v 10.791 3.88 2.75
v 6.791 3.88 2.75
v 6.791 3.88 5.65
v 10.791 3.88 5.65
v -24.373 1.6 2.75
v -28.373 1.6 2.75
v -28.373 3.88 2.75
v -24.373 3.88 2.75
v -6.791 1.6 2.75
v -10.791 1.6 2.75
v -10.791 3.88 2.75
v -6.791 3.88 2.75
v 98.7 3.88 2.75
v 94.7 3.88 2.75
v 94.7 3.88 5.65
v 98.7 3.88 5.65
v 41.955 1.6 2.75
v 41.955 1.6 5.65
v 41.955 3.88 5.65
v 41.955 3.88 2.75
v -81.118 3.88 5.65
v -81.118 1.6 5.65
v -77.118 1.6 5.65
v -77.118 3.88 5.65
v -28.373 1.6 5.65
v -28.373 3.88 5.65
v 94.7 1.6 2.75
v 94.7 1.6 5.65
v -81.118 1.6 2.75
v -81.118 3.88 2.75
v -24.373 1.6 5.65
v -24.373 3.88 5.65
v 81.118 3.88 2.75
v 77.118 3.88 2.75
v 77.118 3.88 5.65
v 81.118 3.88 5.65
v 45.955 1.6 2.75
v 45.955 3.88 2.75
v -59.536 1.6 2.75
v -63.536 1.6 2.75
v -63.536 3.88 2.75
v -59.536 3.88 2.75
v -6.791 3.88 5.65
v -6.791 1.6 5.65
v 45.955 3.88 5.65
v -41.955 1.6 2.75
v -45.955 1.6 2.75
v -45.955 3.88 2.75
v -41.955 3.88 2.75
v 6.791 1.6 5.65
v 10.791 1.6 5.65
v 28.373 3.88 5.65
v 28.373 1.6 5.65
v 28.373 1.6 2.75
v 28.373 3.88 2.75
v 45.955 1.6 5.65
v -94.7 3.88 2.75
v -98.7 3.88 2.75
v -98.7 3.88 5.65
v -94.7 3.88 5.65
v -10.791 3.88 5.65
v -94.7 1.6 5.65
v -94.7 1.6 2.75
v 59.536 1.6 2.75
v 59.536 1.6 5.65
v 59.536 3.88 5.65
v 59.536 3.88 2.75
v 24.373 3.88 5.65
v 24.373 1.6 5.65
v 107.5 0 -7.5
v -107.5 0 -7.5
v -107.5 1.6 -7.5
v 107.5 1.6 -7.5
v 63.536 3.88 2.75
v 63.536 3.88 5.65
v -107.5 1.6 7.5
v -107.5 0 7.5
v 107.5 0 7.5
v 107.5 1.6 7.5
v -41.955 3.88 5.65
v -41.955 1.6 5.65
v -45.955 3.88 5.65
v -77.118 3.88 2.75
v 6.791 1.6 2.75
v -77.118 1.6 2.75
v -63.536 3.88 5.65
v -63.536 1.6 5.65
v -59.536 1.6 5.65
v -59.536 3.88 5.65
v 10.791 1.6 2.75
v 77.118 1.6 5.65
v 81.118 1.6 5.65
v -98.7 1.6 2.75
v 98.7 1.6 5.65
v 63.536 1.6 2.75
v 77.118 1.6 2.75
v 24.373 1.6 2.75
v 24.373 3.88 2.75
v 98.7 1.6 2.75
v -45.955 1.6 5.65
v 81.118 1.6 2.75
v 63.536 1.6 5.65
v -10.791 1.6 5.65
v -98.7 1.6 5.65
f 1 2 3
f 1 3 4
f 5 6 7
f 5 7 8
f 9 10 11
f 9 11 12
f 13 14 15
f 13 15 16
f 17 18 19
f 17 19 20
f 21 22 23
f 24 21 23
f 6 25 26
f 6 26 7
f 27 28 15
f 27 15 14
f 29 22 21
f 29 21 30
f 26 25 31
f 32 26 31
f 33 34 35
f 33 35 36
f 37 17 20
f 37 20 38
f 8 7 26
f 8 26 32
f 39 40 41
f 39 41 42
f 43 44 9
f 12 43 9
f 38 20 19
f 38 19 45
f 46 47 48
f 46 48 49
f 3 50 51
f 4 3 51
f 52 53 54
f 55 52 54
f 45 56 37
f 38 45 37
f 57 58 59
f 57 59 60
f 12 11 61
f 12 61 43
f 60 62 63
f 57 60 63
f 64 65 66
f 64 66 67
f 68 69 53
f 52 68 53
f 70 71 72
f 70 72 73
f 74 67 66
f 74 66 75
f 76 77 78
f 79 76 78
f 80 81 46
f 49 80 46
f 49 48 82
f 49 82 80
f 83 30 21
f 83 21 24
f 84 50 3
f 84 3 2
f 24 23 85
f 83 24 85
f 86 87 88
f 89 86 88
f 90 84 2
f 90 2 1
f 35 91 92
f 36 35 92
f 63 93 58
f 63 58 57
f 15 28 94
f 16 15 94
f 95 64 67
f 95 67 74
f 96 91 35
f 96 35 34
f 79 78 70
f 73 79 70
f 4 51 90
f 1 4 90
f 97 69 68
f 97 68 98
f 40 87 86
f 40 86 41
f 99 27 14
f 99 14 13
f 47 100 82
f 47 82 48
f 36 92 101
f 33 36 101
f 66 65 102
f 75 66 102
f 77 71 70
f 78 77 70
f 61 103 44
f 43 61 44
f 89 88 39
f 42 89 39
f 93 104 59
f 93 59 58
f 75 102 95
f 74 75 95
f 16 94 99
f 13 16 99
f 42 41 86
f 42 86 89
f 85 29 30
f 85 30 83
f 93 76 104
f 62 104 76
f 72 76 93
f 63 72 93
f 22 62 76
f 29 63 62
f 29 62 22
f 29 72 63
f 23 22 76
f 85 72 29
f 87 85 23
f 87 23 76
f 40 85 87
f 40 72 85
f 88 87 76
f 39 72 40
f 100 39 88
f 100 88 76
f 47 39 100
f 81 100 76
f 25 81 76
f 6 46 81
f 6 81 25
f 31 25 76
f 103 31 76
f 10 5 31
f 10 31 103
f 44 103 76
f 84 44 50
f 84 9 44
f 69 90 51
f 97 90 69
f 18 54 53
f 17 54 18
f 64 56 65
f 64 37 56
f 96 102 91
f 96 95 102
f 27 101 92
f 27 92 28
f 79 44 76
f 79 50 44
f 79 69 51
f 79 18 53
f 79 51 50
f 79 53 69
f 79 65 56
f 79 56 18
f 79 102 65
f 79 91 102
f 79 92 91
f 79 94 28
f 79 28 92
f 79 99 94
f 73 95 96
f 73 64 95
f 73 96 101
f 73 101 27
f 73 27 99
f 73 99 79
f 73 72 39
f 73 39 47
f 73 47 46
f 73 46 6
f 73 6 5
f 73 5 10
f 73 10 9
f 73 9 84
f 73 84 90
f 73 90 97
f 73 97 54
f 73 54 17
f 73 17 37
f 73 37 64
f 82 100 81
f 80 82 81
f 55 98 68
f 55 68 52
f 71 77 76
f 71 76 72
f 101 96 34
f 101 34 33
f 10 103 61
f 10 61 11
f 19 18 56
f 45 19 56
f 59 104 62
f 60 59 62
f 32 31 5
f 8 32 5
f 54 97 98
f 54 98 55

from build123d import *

# Parameters (mm, degrees)
SKETCH2_W           = 215
SKETCH2_H           = 15
BOSS_EXTRUDE1_DEPTH = 1.6
SKETCH4_W           = 4
SKETCH4_H           = 2.9
BOSS_EXTRUDE2_DEPTH = 2.28


with BuildPart() as part:
    # Sketch2 → Boss-Extrude1 (new body)
    with BuildSketch(Plane(origin=(0, 0, 0), x_dir=(1, 0, 0), z_dir=(0, 1, 0))):
        Rectangle(SKETCH2_W, SKETCH2_H)
    extrude(amount=BOSS_EXTRUDE1_DEPTH)

    # Sketch4 → Boss-Extrude2 (add)
    with BuildSketch(Plane(origin=(0, 1.6, 0), x_dir=(1, 0, 0), z_dir=(0, 1, 0))):
        with Locations((-96.7, -4.2)):
            Rectangle(SKETCH4_W, SKETCH4_H)
        with Locations((-79.118, -4.2)):
            Rectangle(SKETCH4_W, SKETCH4_H)
        with Locations((-61.536, -4.2)):
            Rectangle(SKETCH4_W, SKETCH4_H)
        with Locations((-43.955, -4.2)):
            Rectangle(SKETCH4_W, SKETCH4_H)
        with Locations((-26.373, -4.2)):
            Rectangle(SKETCH4_W, SKETCH4_H)
        with Locations((-8.791, -4.2)):
            Rectangle(SKETCH4_W, SKETCH4_H)
        with Locations((8.791, -4.2)):
            Rectangle(SKETCH4_W, SKETCH4_H)
        with Locations((26.373, -4.2)):
            Rectangle(SKETCH4_W, SKETCH4_H)
        with Locations((43.955, -4.2)):
            Rectangle(SKETCH4_W, SKETCH4_H)
        with Locations((61.536, -4.2)):
            Rectangle(SKETCH4_W, SKETCH4_H)
        with Locations((79.118, -4.2)):
            Rectangle(SKETCH4_W, SKETCH4_H)
        with Locations((96.7, -4.2)):
            Rectangle(SKETCH4_W, SKETCH4_H)
    extrude(amount=BOSS_EXTRUDE2_DEPTH)


solid = part.part
